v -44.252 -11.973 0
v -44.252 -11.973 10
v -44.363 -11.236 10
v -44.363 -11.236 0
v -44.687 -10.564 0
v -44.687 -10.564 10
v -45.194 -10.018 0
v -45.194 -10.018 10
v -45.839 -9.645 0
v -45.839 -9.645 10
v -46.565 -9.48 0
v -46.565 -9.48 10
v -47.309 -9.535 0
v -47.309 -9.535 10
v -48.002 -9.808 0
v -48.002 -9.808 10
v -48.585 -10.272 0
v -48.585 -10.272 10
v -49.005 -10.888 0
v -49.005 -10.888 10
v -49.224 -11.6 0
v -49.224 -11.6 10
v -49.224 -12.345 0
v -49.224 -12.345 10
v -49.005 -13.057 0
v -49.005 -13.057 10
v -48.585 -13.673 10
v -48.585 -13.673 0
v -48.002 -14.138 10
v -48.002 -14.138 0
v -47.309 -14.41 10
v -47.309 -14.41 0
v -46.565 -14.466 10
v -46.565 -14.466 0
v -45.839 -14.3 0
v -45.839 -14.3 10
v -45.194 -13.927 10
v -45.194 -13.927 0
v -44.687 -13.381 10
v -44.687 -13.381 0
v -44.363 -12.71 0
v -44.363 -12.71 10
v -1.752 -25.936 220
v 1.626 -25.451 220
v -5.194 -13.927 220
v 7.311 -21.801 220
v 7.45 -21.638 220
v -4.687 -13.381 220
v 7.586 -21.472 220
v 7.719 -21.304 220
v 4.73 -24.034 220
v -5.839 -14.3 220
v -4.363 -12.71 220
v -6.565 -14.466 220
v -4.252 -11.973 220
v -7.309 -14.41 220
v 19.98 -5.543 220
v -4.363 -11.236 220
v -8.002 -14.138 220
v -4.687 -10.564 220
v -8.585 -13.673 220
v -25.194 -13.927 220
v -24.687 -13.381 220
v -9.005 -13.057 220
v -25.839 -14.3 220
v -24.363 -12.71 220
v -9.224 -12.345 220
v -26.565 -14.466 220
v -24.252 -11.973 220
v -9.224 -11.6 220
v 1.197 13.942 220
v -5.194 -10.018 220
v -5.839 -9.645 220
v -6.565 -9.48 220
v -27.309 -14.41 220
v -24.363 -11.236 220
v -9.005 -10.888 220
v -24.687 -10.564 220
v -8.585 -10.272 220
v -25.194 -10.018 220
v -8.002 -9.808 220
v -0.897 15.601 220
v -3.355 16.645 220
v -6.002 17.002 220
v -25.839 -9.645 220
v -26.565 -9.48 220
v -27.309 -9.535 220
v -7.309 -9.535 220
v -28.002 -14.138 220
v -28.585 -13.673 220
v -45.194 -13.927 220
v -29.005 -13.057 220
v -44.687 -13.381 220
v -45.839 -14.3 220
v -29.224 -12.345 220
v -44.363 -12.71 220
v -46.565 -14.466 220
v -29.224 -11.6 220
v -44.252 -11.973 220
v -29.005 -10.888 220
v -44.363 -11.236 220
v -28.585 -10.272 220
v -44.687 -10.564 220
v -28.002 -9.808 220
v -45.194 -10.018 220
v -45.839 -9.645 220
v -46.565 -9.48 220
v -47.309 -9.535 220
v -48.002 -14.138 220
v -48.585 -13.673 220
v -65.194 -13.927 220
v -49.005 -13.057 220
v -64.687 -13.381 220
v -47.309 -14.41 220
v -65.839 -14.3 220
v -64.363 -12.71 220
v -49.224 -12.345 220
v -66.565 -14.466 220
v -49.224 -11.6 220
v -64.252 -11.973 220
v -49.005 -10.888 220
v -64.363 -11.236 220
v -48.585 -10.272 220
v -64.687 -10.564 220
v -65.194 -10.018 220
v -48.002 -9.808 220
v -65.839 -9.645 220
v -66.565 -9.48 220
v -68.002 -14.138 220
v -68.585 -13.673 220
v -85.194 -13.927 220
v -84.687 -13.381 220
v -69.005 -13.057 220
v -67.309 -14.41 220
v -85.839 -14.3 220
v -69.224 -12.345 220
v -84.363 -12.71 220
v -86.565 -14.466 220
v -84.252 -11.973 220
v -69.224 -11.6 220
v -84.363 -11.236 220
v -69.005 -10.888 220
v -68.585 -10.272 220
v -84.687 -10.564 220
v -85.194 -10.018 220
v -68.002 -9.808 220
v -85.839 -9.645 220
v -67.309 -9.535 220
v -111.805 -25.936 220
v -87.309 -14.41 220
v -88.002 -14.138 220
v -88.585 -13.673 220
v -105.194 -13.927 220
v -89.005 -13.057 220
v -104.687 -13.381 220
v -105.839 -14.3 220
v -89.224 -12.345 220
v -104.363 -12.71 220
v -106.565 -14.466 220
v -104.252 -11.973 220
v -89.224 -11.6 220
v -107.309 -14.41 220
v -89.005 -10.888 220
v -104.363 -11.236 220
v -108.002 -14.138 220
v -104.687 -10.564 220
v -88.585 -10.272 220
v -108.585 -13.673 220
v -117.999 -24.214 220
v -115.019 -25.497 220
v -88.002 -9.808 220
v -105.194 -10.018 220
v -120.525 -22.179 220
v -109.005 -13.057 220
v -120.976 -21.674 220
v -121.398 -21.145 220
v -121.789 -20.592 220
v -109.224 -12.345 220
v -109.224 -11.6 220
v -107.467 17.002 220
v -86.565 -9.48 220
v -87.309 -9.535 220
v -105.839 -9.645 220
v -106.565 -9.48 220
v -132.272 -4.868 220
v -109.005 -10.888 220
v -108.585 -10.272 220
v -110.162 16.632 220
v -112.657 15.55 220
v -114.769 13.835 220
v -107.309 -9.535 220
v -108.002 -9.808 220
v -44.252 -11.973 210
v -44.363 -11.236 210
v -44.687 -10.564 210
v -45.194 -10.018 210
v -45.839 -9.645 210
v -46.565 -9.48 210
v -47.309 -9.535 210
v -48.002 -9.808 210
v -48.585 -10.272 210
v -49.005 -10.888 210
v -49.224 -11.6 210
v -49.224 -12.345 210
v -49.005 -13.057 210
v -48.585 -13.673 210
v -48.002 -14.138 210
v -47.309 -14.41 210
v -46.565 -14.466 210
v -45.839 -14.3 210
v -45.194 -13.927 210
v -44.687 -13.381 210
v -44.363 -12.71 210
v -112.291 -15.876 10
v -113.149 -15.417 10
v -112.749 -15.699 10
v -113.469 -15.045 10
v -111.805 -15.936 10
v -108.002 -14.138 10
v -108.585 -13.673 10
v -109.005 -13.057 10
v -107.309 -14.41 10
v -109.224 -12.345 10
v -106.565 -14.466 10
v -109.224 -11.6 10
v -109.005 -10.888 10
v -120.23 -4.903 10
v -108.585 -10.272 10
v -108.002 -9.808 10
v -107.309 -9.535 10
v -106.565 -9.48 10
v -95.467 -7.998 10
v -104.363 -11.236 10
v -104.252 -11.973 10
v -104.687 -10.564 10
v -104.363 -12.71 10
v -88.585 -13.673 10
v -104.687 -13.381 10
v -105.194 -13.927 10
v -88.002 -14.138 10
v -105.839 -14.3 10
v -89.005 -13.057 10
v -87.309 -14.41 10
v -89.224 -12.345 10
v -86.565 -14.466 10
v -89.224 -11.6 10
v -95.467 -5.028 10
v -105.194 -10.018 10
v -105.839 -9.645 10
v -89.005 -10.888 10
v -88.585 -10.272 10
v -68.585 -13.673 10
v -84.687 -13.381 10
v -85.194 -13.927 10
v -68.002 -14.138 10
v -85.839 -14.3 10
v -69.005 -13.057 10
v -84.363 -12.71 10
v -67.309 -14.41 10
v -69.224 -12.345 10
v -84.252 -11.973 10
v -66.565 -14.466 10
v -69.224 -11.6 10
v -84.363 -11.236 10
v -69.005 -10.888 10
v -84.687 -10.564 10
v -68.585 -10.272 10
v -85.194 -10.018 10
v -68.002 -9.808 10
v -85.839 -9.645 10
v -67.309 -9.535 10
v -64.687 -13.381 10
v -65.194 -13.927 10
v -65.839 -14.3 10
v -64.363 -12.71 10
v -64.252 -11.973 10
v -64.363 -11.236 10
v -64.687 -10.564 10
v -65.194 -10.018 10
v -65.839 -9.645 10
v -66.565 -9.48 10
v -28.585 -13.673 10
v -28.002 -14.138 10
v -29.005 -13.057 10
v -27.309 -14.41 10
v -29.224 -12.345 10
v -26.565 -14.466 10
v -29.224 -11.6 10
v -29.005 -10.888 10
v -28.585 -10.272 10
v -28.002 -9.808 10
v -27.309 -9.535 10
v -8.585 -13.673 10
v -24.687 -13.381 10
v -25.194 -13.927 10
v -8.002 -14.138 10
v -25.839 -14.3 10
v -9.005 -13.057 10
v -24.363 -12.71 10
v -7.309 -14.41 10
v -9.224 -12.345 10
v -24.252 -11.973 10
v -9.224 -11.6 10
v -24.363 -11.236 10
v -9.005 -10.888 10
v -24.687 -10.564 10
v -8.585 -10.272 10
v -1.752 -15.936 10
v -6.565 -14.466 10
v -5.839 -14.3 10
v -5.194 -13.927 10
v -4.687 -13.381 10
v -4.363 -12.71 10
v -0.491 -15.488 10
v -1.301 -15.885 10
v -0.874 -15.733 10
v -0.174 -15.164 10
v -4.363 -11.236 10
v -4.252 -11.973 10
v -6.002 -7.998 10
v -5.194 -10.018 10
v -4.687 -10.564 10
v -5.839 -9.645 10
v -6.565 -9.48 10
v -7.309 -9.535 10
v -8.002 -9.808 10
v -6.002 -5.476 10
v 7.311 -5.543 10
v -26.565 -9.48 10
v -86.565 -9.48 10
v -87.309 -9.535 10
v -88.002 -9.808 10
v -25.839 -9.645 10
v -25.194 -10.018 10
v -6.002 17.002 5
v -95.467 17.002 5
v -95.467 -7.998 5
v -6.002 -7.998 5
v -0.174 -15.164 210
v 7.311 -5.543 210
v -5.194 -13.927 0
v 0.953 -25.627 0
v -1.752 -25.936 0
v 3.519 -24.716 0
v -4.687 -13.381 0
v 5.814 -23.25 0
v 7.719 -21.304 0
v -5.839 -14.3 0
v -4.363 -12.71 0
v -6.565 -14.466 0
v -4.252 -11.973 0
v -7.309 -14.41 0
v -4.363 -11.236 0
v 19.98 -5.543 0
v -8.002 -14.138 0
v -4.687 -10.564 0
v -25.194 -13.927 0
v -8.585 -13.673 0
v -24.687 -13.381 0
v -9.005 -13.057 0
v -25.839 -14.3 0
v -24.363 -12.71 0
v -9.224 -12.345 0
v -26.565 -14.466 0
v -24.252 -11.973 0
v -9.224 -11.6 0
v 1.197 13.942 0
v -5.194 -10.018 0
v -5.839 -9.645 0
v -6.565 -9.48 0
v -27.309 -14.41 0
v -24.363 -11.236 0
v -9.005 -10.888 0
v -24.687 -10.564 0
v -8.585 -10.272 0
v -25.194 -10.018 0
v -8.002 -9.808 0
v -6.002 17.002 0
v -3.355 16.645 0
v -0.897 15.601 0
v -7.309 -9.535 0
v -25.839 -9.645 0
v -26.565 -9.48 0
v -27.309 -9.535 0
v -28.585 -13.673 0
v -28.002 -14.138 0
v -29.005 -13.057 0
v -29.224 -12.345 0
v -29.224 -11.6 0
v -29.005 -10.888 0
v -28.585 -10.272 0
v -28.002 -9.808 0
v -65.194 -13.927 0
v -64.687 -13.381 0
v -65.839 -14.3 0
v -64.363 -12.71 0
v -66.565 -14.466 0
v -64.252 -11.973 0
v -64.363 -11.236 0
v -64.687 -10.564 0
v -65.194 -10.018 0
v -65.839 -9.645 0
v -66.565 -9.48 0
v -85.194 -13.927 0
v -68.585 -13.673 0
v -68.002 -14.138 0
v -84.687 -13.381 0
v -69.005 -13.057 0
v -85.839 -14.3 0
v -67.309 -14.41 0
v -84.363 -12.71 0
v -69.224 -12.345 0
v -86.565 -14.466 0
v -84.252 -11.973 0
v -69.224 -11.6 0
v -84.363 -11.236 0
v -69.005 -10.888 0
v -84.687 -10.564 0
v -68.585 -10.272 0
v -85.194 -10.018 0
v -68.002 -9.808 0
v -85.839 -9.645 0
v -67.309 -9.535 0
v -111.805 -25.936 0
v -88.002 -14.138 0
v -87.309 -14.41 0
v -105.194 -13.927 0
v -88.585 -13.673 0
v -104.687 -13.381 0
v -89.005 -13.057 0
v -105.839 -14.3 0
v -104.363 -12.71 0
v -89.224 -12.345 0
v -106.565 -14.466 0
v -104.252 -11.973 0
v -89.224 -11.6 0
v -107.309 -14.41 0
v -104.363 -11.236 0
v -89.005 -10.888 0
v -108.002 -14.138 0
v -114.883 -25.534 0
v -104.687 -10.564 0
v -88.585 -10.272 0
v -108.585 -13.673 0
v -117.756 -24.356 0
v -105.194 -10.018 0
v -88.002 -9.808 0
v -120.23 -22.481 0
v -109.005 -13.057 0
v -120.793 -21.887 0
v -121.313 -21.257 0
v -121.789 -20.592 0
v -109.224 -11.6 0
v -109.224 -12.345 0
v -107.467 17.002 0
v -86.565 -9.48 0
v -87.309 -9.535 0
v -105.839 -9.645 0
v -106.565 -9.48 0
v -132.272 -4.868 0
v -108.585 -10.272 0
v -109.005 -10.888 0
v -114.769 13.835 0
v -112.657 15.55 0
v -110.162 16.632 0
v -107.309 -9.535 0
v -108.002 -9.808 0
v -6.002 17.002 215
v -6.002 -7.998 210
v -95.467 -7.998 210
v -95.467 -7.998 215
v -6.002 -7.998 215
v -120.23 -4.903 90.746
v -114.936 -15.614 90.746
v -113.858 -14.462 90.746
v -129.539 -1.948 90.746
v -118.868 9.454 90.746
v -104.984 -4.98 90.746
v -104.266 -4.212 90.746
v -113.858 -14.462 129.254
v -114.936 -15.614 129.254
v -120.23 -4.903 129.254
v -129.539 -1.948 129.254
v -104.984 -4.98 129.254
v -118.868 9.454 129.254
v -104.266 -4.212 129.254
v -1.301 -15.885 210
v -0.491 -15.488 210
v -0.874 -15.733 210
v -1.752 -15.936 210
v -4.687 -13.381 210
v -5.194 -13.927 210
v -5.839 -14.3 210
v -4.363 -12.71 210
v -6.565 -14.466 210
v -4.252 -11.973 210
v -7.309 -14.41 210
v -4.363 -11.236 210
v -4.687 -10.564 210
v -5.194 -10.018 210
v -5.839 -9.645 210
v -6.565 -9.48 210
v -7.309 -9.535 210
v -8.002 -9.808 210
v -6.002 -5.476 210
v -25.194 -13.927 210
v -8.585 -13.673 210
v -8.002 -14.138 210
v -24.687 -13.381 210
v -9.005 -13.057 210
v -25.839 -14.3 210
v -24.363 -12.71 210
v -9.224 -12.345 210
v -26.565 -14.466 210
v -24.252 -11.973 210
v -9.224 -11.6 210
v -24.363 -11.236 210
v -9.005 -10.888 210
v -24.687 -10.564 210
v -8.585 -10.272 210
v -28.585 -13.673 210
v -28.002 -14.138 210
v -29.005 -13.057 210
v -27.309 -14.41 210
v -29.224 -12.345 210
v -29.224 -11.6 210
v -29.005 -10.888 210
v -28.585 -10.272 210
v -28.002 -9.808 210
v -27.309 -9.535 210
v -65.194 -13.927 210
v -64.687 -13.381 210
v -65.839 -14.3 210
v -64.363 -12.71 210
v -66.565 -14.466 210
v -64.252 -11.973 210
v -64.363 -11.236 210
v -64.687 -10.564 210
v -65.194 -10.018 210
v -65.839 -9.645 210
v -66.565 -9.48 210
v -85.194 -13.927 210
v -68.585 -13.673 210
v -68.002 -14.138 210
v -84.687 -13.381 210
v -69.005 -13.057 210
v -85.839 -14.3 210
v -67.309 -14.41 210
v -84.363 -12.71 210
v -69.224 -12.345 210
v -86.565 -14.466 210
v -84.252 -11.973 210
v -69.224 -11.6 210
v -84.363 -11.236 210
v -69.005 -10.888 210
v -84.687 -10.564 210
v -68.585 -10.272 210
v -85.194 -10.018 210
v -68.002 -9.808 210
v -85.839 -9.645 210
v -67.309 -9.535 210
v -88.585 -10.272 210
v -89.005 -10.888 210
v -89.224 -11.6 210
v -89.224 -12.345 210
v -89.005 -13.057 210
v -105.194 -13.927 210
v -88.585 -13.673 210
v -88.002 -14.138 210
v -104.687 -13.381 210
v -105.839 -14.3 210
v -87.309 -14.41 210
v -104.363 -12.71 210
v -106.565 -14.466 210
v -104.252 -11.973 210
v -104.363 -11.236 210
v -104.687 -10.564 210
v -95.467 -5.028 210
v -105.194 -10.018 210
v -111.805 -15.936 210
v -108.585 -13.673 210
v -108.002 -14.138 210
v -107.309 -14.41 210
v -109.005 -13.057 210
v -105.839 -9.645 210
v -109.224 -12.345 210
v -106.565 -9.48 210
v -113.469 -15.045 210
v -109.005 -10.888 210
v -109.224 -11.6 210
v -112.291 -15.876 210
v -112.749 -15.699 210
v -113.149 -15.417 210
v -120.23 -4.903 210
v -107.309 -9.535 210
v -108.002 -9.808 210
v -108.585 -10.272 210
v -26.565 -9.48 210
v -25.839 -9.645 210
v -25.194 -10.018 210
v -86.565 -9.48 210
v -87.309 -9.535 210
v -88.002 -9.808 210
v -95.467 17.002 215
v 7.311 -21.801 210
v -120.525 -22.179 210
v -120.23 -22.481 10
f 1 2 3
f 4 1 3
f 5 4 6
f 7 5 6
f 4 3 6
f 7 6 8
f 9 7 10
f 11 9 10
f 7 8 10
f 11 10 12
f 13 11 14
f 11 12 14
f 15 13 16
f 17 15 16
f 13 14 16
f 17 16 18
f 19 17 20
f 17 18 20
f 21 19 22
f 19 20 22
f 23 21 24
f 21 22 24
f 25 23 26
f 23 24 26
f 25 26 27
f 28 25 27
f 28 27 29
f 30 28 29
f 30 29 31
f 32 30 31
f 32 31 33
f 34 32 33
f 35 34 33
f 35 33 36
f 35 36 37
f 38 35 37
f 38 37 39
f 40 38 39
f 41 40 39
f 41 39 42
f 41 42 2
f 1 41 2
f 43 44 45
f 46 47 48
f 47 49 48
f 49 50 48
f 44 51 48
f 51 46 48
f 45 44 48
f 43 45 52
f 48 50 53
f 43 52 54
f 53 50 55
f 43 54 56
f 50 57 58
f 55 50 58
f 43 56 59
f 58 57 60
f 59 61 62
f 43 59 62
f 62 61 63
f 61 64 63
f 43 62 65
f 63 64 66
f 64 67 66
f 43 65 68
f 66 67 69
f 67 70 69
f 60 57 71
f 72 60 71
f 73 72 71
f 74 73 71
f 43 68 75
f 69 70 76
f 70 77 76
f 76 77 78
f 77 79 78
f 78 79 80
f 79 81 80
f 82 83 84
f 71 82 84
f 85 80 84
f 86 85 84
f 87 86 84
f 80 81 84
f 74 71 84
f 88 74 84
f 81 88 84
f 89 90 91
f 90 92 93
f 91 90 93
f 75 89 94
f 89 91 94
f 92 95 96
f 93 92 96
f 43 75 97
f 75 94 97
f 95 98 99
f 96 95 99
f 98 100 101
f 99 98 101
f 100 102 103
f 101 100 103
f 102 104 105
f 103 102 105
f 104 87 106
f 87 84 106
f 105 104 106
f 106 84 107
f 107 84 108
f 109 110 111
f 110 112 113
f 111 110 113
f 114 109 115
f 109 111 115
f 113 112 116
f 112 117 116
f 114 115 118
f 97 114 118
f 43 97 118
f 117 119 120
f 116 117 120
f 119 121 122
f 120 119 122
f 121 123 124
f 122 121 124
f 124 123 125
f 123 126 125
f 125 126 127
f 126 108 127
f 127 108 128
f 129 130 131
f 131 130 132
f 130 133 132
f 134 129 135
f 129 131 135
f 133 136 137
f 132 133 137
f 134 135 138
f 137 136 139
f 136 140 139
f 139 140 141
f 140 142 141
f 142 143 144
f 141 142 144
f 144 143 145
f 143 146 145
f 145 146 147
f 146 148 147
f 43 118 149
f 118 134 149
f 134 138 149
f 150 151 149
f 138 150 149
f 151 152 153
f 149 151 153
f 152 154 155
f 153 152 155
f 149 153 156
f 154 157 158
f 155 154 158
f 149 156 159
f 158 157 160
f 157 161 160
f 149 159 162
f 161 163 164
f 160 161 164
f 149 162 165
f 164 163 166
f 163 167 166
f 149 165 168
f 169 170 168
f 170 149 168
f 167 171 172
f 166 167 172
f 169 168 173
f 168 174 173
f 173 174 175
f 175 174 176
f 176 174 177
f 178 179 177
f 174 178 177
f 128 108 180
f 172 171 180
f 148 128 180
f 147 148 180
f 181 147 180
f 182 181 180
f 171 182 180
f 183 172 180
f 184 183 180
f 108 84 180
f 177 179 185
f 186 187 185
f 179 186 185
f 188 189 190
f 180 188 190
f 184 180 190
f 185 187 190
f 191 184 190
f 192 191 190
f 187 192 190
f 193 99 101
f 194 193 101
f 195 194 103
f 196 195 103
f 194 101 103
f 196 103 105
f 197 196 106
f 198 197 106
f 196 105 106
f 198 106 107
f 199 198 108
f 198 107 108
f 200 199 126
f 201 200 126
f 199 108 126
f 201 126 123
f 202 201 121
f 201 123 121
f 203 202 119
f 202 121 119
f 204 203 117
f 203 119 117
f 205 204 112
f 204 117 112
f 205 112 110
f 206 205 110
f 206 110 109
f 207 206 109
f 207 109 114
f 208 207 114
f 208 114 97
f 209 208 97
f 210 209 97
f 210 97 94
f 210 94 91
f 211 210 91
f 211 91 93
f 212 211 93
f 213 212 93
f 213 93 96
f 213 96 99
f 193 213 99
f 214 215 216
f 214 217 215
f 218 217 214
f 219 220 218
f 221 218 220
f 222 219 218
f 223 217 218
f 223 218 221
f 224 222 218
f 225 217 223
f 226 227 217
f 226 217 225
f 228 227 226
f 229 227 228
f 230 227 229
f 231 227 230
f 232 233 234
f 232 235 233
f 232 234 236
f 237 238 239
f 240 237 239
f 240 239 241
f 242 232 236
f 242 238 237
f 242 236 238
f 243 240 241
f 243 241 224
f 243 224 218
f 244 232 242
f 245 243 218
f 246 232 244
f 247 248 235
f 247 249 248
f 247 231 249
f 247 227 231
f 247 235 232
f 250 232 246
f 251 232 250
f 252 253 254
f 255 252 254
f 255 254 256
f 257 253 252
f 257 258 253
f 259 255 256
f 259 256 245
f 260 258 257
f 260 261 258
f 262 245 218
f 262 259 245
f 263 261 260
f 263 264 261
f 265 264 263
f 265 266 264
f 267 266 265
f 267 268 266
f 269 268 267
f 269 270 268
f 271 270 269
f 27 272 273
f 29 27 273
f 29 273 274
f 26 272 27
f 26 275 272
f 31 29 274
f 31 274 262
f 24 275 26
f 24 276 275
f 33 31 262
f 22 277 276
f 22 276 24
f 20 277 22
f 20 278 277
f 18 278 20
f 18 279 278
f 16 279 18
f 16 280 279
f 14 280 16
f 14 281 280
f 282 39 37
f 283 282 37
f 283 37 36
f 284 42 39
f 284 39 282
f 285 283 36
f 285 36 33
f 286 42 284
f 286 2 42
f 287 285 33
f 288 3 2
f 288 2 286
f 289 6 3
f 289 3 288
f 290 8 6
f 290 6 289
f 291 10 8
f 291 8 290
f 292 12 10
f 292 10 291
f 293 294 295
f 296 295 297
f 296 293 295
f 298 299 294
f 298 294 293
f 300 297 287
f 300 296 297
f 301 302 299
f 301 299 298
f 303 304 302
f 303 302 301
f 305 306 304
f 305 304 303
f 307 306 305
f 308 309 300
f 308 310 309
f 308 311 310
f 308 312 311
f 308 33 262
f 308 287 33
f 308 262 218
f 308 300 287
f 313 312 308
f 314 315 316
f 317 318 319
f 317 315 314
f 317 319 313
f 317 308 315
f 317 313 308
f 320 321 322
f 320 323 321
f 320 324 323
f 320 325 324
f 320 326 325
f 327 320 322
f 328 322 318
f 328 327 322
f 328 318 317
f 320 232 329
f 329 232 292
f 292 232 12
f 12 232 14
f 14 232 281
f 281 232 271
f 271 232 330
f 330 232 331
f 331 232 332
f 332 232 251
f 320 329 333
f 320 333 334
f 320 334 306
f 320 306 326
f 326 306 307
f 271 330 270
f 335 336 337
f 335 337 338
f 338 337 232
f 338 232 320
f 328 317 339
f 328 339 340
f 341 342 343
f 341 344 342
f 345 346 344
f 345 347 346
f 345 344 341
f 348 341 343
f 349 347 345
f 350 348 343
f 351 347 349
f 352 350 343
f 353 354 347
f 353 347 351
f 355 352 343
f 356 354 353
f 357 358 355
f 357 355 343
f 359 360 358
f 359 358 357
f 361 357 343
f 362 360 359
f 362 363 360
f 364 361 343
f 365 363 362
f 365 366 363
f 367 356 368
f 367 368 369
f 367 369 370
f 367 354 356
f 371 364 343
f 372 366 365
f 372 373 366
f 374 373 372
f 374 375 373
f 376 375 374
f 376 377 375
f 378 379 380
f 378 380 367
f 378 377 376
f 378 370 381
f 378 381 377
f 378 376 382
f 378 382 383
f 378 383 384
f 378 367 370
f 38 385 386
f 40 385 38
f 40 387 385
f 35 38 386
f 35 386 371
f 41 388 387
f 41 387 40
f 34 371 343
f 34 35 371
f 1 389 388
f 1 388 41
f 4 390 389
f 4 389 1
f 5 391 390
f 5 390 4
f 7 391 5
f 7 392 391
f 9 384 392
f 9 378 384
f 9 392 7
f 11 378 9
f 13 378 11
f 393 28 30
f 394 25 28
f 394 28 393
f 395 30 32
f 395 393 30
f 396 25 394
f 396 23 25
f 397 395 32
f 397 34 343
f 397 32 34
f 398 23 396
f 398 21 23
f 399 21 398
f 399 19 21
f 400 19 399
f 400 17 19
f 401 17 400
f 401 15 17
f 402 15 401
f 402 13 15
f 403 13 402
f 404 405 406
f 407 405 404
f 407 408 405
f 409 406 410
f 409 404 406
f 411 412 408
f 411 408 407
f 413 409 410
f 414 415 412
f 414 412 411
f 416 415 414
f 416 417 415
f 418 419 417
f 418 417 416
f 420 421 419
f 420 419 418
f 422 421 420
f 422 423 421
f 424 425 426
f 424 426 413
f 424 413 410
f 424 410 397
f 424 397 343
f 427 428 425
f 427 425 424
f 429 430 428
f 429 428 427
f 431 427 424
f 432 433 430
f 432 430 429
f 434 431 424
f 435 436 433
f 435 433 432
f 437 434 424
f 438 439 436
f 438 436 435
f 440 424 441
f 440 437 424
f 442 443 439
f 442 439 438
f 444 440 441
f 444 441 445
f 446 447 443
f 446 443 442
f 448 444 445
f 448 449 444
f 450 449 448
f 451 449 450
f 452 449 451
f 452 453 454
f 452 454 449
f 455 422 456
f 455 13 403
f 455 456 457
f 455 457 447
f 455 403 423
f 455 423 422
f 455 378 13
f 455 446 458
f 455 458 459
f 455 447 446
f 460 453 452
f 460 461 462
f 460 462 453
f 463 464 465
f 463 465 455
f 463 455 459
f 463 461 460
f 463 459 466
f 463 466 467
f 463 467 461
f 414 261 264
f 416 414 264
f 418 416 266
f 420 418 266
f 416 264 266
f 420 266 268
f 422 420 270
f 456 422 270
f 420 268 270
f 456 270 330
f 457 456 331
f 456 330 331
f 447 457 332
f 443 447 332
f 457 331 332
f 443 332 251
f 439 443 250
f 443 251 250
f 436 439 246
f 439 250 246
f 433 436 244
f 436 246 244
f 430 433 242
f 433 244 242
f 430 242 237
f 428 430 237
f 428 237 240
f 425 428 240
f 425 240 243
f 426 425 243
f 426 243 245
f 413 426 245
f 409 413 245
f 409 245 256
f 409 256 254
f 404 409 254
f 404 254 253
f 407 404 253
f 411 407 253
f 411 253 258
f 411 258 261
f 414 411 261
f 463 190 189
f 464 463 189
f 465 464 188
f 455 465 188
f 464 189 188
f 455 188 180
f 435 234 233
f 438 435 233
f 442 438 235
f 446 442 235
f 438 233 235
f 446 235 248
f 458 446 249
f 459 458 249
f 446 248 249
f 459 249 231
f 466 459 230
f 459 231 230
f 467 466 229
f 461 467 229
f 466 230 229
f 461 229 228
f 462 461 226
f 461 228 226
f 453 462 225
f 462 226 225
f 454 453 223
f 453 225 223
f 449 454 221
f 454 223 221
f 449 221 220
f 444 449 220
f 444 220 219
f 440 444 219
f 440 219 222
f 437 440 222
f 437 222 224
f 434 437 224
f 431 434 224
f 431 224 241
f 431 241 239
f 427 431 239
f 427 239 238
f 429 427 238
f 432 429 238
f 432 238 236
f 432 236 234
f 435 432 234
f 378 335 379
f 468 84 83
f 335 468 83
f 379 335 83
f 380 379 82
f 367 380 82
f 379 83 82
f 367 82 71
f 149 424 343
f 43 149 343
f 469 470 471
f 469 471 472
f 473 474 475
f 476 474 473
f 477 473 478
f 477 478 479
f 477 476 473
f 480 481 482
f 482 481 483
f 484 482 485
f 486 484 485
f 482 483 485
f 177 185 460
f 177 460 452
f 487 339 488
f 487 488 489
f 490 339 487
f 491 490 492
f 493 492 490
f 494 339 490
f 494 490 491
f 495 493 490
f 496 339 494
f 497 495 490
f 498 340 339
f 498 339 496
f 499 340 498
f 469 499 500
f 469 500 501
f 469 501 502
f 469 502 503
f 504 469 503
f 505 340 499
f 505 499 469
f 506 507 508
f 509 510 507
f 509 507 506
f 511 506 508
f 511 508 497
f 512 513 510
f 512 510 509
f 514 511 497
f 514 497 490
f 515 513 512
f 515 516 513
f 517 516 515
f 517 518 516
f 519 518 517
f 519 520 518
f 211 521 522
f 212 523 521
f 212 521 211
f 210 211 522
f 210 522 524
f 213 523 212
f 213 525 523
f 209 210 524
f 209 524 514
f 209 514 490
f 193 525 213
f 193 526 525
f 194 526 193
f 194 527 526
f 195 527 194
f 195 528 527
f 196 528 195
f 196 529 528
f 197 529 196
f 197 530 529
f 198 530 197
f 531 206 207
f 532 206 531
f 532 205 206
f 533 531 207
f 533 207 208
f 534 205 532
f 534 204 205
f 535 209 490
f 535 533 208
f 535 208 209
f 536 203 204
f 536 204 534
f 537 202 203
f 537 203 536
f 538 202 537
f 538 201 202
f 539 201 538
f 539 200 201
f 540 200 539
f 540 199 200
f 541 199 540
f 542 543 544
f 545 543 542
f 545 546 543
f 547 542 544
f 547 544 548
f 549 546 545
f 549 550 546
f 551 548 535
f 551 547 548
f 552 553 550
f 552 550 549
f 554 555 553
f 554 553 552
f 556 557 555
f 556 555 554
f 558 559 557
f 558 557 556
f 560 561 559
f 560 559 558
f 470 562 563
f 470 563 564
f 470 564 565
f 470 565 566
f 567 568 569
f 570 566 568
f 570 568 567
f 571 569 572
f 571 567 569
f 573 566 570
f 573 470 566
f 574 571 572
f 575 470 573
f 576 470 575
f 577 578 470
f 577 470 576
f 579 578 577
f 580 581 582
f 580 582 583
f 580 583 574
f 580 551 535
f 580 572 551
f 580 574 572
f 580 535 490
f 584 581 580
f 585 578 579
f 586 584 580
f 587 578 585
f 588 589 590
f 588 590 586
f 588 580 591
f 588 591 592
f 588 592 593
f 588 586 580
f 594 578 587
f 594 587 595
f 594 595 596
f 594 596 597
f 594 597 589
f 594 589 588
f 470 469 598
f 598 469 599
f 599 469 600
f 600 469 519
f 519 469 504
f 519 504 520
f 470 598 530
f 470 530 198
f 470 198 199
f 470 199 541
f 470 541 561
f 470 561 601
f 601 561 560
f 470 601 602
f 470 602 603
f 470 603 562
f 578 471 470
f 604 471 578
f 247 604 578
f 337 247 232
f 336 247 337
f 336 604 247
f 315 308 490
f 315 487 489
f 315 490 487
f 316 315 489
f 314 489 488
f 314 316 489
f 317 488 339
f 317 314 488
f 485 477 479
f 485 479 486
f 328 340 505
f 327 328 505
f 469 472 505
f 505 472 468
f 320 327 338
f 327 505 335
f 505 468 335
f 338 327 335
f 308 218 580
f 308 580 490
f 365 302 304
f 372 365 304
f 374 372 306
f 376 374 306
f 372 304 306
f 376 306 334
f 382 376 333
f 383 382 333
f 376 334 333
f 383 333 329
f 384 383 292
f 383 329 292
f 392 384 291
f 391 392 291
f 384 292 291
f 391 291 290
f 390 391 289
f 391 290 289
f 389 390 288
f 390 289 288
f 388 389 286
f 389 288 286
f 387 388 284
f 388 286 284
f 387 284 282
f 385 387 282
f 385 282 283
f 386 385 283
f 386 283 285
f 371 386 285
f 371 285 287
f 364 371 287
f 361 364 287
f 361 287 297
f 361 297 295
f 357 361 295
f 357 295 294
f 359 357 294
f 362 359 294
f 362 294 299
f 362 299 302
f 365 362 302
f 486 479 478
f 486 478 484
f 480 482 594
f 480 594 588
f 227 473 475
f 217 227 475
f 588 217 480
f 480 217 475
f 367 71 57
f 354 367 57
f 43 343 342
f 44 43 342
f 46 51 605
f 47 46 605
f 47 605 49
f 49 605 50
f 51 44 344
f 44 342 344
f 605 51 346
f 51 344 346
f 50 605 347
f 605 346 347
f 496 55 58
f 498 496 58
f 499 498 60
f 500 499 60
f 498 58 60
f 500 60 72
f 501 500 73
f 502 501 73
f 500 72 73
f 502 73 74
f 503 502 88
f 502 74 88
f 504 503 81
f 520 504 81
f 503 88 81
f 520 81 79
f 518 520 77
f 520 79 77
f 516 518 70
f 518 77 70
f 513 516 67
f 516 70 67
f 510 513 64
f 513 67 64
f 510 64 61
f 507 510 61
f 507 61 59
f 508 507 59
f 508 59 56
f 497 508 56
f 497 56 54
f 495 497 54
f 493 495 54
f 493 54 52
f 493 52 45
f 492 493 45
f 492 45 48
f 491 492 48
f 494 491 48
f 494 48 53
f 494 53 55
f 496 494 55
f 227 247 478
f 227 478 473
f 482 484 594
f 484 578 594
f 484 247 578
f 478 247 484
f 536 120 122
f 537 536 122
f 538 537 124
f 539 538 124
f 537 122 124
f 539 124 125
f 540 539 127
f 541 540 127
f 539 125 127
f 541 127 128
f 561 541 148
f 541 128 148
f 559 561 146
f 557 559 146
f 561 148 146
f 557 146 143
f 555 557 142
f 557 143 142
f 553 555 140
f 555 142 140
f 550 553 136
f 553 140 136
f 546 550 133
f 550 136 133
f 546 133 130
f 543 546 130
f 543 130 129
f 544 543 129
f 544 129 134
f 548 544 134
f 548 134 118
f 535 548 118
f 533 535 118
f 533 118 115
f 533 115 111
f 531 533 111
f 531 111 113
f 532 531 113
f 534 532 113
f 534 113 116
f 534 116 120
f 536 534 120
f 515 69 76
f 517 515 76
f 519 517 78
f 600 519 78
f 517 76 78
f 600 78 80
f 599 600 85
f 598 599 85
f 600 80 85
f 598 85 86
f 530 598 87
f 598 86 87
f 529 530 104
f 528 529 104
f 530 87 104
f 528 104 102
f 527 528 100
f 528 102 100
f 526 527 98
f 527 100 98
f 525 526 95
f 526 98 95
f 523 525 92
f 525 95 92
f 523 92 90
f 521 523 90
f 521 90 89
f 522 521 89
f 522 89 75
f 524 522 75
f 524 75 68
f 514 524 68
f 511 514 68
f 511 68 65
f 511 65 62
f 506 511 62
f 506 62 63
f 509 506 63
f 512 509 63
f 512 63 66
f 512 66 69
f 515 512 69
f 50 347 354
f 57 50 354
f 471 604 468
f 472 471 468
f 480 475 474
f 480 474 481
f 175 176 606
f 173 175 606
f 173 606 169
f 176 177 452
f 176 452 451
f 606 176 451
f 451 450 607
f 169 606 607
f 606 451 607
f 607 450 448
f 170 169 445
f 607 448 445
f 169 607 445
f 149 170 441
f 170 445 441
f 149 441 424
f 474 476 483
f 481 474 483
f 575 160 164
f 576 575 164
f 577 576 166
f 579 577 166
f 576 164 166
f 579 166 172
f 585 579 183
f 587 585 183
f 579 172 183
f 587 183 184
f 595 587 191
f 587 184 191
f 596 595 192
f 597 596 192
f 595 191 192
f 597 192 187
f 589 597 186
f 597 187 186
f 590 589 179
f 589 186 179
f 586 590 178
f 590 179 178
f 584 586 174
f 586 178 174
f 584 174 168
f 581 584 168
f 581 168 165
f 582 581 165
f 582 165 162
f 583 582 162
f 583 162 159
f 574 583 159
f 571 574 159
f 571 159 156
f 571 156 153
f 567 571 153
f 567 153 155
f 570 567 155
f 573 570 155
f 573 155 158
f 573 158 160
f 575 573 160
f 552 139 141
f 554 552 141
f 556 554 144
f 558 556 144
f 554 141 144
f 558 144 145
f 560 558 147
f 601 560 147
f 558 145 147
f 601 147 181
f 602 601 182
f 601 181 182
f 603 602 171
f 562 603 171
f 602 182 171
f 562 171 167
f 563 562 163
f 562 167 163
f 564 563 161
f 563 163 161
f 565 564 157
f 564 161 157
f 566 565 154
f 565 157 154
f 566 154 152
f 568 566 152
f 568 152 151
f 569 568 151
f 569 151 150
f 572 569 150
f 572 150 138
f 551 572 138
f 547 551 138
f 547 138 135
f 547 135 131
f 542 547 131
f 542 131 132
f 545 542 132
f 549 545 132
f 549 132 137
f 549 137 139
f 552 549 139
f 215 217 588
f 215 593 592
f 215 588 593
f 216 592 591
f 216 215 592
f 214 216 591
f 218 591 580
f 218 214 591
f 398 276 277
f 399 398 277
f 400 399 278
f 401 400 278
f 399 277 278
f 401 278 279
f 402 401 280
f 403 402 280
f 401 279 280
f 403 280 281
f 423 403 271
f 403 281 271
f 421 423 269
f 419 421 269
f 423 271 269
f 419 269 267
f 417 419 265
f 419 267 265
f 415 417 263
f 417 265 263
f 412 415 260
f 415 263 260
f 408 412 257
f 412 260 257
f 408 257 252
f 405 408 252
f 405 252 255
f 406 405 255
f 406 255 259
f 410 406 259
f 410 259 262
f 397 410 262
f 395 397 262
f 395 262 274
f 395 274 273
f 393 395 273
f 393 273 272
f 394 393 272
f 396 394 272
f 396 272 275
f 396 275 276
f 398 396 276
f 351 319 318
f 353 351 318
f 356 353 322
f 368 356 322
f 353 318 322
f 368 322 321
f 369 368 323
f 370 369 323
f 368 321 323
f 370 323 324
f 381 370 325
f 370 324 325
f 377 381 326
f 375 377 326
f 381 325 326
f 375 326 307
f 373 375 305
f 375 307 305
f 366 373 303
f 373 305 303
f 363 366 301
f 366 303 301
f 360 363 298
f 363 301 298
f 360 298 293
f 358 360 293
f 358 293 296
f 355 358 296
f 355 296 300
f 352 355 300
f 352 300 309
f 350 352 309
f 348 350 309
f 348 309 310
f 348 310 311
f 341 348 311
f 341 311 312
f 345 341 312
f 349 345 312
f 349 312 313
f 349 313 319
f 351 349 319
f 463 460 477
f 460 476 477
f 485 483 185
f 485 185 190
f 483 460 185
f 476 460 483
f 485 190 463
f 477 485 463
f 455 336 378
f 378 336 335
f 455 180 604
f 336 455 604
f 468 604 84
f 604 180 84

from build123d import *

# Parameters (mm, degrees)
EXTRUDE_THIN1_DEPTH = 220
BOSS_EXTRUDE1_DEPTH = 10
BOSS_EXTRUDE2_DEPTH = 10
CUT_EXTRUDE1_DEPTH  = 221
SKETCH6_R           = 2.5
CUT_EXTRUDE3_DEPTH  = 221
BOSS_EXTRUDE3_DEPTH = 220
SKETCH9_W           = 89.464875501
SKETCH9_H           = 210
CUT_EXTRUDE5_DEPTH  = 25
SKETCH10_W          = 38.507874252
SKETCH10_H          = 15.616205768
CUT_EXTRUDE6_DEPTH  = 20


with BuildPart() as part:
    # Sketch1 → Extrude-Thin1 (new body)
    with BuildSketch(Plane.XY):
        with BuildLine():
            Line((-111.804811095, -25.936023273), (-1.752290831, -25.936023273))
            ThreePointArc((-1.752290831, -25.936023273), (3.519458689, -24.716035193), (7.71929628, -21.304132772))
            Line((7.71929628, -21.304132772), (21.420171512, -3.691876429))
            Line((21.420171512, -3.691876429), (8.721276915, 5.936816741))
            ThreePointArc((8.721276915, 5.936816741), (3.01180177, 8.957008398), (-3.362508592, 10))
            Line((-3.362508592, 10), (-109.847422235, 10))
            ThreePointArc((-109.847422235, 10), (-115.643105208, 9.14184053), (-120.941426159, 6.641005887))
            Line((-120.941426159, 6.641005887), (-134.097771182, -2.129890795))
            Line((-134.097771182, -2.129890795), (-121.789414627, -20.592425628))
            ThreePointArc((-121.789414627, -20.592425628), (-117.467106201, -24.516118458), (-111.804811095, -25.936023273))
        make_face()
        with BuildLine():
            Line((-111.804811095, -15.936023273), (-1.752290831, -15.936023273))
            ThreePointArc((-1.752290831, -15.936023273), (-0.873665911, -15.732691927), (-0.17369298, -15.164041523))
            Line((-0.17369298, -15.164041523), (7.310590323, -5.543114841))
            Line((7.310590323, -5.543114841), (2.679384161, -2.03159163))
            ThreePointArc((2.679384161, -2.03159163), (-0.175353411, -0.521495801), (-3.362508592, 0))
            Line((-3.362508592, 0), (-109.847422235, 0))
            ThreePointArc((-109.847422235, 0), (-112.745263722, -0.429079735), (-115.394424197, -1.679497057))
            Line((-115.394424197, -1.679497057), (-120.230266277, -4.903391776))
            Line((-120.230266277, -4.903391776), (-113.468911684, -15.045423666))
            ThreePointArc((-113.468911684, -15.045423666), (-112.748526946, -15.699372471), (-111.804811095, -15.936023273))
        make_face(mode=Mode.SUBTRACT)
    extrude(amount=EXTRUDE_THIN1_DEPTH)

    # Sketch3 → Boss-Extrude1 (add)
    with BuildSketch(Plane.XY.offset(220)):
        Polygon((-120.230266277, -4.903391776), (7.310590323, -5.543114841), (7.310590323, -21.801402169), (-120.525433927, -22.179247), align=None)
    extrude(amount=-BOSS_EXTRUDE1_DEPTH)

    # Sketch4 → Boss-Extrude2 (add)
    with BuildSketch(Plane(origin=(0, 0, 0), x_dir=(-1, 0, 0), z_dir=(0, 0, -1))):
        Polygon((-7.310590323, -5.543114841), (120.230266277, -4.903391776), (120.230266277, -22.480711973), (-5.288915881, -22.480711973), (-7.235397459, -20.534230396), align=None)
    extrude(amount=-BOSS_EXTRUDE2_DEPTH)

    # Sketch5 → Cut-Extrude1 (cut, through all)
    with BuildSketch(Plane(origin=(0, 0, 0), x_dir=(-1, 0, 0), z_dir=(0, 0, -1))):
        Polygon((-7.310590323, -5.543114841), (-30.090389748, -5.543114841), (-30.090389748, 22.160064079), (140.461111039, 22.160064079), (140.461111039, -4.844552144), (120.230266277, -4.903391776), align=None)
    extrude(amount=-CUT_EXTRUDE1_DEPTH, mode=Mode.SUBTRACT)

    # Sketch6 → Cut-Extrude3 (cut, through all)
    with BuildSketch(Plane.XY.offset(220)):
        with Locations((-106.752290831, -11.972659606)):
            Circle(SKETCH6_R)
        with Locations((-6.752290831, -11.972659606)):
            Circle(SKETCH6_R)
        with Locations((-86.752290831, -11.972659606)):
            Circle(SKETCH6_R)
        with Locations((-66.752290831, -11.972659606)):
            Circle(SKETCH6_R)
        with Locations((-46.752290831, -11.972659606)):
            Circle(SKETCH6_R)
        with Locations((-26.752290831, -11.972659606)):
            Circle(SKETCH6_R)
    extrude(amount=-CUT_EXTRUDE3_DEPTH, mode=Mode.SUBTRACT)

    # Sketch8 → Boss-Extrude3 (add)
    with BuildSketch(Plane.XY.offset(220)):
        with BuildLine():
            Line((-107.467244942, 17.002107807), (-6.002369441, 17.002107807))
            ThreePointArc((-6.002369441, 17.002107807), (-2.090901759, 16.205390949), (1.197299473, 13.942191923))
            Line((1.197299473, 13.942191923), (19.98006151, -5.543114841))
            Line((19.98006151, -5.543114841), (7.310590323, -5.543114841))
            Line((7.310590323, -5.543114841), (-120.230266277, -4.903391776))
            Line((-120.230266277, -4.903391776), (-132.272118974, -4.868369107))
            Line((-132.272118974, -4.868369107), (-114.768654919, 13.835072929))
            ThreePointArc((-114.768654919, 13.835072929), (-111.446588404, 16.176246765), (-107.467244942, 17.002107807))
        make_face()
    extrude(amount=-BOSS_EXTRUDE3_DEPTH)

    # Sketch9 → Cut-Extrude5 (cut)
    with BuildSketch(Plane(origin=(0, 17.002107807, 0), x_dir=(1, 0, 0), z_dir=(0, 1, 0))):
        with Locations((-50.734807192, -110)):
            Rectangle(SKETCH9_W, SKETCH9_H)
    extrude(amount=-CUT_EXTRUDE5_DEPTH, mode=Mode.SUBTRACT)

    # Sketch10 → Cut-Extrude6 (cut)
    with BuildSketch(Plane(origin=(-68.086200957, 63.717917206, 0), x_dir=(0, 0, 1), z_dir=(-0.730140998, 0.683296512, 0))):
        with Locations((110, -82.127570542)):
            Rectangle(SKETCH10_W, SKETCH10_H)
    extrude(amount=-CUT_EXTRUDE6_DEPTH, mode=Mode.SUBTRACT)


solid = part.part
